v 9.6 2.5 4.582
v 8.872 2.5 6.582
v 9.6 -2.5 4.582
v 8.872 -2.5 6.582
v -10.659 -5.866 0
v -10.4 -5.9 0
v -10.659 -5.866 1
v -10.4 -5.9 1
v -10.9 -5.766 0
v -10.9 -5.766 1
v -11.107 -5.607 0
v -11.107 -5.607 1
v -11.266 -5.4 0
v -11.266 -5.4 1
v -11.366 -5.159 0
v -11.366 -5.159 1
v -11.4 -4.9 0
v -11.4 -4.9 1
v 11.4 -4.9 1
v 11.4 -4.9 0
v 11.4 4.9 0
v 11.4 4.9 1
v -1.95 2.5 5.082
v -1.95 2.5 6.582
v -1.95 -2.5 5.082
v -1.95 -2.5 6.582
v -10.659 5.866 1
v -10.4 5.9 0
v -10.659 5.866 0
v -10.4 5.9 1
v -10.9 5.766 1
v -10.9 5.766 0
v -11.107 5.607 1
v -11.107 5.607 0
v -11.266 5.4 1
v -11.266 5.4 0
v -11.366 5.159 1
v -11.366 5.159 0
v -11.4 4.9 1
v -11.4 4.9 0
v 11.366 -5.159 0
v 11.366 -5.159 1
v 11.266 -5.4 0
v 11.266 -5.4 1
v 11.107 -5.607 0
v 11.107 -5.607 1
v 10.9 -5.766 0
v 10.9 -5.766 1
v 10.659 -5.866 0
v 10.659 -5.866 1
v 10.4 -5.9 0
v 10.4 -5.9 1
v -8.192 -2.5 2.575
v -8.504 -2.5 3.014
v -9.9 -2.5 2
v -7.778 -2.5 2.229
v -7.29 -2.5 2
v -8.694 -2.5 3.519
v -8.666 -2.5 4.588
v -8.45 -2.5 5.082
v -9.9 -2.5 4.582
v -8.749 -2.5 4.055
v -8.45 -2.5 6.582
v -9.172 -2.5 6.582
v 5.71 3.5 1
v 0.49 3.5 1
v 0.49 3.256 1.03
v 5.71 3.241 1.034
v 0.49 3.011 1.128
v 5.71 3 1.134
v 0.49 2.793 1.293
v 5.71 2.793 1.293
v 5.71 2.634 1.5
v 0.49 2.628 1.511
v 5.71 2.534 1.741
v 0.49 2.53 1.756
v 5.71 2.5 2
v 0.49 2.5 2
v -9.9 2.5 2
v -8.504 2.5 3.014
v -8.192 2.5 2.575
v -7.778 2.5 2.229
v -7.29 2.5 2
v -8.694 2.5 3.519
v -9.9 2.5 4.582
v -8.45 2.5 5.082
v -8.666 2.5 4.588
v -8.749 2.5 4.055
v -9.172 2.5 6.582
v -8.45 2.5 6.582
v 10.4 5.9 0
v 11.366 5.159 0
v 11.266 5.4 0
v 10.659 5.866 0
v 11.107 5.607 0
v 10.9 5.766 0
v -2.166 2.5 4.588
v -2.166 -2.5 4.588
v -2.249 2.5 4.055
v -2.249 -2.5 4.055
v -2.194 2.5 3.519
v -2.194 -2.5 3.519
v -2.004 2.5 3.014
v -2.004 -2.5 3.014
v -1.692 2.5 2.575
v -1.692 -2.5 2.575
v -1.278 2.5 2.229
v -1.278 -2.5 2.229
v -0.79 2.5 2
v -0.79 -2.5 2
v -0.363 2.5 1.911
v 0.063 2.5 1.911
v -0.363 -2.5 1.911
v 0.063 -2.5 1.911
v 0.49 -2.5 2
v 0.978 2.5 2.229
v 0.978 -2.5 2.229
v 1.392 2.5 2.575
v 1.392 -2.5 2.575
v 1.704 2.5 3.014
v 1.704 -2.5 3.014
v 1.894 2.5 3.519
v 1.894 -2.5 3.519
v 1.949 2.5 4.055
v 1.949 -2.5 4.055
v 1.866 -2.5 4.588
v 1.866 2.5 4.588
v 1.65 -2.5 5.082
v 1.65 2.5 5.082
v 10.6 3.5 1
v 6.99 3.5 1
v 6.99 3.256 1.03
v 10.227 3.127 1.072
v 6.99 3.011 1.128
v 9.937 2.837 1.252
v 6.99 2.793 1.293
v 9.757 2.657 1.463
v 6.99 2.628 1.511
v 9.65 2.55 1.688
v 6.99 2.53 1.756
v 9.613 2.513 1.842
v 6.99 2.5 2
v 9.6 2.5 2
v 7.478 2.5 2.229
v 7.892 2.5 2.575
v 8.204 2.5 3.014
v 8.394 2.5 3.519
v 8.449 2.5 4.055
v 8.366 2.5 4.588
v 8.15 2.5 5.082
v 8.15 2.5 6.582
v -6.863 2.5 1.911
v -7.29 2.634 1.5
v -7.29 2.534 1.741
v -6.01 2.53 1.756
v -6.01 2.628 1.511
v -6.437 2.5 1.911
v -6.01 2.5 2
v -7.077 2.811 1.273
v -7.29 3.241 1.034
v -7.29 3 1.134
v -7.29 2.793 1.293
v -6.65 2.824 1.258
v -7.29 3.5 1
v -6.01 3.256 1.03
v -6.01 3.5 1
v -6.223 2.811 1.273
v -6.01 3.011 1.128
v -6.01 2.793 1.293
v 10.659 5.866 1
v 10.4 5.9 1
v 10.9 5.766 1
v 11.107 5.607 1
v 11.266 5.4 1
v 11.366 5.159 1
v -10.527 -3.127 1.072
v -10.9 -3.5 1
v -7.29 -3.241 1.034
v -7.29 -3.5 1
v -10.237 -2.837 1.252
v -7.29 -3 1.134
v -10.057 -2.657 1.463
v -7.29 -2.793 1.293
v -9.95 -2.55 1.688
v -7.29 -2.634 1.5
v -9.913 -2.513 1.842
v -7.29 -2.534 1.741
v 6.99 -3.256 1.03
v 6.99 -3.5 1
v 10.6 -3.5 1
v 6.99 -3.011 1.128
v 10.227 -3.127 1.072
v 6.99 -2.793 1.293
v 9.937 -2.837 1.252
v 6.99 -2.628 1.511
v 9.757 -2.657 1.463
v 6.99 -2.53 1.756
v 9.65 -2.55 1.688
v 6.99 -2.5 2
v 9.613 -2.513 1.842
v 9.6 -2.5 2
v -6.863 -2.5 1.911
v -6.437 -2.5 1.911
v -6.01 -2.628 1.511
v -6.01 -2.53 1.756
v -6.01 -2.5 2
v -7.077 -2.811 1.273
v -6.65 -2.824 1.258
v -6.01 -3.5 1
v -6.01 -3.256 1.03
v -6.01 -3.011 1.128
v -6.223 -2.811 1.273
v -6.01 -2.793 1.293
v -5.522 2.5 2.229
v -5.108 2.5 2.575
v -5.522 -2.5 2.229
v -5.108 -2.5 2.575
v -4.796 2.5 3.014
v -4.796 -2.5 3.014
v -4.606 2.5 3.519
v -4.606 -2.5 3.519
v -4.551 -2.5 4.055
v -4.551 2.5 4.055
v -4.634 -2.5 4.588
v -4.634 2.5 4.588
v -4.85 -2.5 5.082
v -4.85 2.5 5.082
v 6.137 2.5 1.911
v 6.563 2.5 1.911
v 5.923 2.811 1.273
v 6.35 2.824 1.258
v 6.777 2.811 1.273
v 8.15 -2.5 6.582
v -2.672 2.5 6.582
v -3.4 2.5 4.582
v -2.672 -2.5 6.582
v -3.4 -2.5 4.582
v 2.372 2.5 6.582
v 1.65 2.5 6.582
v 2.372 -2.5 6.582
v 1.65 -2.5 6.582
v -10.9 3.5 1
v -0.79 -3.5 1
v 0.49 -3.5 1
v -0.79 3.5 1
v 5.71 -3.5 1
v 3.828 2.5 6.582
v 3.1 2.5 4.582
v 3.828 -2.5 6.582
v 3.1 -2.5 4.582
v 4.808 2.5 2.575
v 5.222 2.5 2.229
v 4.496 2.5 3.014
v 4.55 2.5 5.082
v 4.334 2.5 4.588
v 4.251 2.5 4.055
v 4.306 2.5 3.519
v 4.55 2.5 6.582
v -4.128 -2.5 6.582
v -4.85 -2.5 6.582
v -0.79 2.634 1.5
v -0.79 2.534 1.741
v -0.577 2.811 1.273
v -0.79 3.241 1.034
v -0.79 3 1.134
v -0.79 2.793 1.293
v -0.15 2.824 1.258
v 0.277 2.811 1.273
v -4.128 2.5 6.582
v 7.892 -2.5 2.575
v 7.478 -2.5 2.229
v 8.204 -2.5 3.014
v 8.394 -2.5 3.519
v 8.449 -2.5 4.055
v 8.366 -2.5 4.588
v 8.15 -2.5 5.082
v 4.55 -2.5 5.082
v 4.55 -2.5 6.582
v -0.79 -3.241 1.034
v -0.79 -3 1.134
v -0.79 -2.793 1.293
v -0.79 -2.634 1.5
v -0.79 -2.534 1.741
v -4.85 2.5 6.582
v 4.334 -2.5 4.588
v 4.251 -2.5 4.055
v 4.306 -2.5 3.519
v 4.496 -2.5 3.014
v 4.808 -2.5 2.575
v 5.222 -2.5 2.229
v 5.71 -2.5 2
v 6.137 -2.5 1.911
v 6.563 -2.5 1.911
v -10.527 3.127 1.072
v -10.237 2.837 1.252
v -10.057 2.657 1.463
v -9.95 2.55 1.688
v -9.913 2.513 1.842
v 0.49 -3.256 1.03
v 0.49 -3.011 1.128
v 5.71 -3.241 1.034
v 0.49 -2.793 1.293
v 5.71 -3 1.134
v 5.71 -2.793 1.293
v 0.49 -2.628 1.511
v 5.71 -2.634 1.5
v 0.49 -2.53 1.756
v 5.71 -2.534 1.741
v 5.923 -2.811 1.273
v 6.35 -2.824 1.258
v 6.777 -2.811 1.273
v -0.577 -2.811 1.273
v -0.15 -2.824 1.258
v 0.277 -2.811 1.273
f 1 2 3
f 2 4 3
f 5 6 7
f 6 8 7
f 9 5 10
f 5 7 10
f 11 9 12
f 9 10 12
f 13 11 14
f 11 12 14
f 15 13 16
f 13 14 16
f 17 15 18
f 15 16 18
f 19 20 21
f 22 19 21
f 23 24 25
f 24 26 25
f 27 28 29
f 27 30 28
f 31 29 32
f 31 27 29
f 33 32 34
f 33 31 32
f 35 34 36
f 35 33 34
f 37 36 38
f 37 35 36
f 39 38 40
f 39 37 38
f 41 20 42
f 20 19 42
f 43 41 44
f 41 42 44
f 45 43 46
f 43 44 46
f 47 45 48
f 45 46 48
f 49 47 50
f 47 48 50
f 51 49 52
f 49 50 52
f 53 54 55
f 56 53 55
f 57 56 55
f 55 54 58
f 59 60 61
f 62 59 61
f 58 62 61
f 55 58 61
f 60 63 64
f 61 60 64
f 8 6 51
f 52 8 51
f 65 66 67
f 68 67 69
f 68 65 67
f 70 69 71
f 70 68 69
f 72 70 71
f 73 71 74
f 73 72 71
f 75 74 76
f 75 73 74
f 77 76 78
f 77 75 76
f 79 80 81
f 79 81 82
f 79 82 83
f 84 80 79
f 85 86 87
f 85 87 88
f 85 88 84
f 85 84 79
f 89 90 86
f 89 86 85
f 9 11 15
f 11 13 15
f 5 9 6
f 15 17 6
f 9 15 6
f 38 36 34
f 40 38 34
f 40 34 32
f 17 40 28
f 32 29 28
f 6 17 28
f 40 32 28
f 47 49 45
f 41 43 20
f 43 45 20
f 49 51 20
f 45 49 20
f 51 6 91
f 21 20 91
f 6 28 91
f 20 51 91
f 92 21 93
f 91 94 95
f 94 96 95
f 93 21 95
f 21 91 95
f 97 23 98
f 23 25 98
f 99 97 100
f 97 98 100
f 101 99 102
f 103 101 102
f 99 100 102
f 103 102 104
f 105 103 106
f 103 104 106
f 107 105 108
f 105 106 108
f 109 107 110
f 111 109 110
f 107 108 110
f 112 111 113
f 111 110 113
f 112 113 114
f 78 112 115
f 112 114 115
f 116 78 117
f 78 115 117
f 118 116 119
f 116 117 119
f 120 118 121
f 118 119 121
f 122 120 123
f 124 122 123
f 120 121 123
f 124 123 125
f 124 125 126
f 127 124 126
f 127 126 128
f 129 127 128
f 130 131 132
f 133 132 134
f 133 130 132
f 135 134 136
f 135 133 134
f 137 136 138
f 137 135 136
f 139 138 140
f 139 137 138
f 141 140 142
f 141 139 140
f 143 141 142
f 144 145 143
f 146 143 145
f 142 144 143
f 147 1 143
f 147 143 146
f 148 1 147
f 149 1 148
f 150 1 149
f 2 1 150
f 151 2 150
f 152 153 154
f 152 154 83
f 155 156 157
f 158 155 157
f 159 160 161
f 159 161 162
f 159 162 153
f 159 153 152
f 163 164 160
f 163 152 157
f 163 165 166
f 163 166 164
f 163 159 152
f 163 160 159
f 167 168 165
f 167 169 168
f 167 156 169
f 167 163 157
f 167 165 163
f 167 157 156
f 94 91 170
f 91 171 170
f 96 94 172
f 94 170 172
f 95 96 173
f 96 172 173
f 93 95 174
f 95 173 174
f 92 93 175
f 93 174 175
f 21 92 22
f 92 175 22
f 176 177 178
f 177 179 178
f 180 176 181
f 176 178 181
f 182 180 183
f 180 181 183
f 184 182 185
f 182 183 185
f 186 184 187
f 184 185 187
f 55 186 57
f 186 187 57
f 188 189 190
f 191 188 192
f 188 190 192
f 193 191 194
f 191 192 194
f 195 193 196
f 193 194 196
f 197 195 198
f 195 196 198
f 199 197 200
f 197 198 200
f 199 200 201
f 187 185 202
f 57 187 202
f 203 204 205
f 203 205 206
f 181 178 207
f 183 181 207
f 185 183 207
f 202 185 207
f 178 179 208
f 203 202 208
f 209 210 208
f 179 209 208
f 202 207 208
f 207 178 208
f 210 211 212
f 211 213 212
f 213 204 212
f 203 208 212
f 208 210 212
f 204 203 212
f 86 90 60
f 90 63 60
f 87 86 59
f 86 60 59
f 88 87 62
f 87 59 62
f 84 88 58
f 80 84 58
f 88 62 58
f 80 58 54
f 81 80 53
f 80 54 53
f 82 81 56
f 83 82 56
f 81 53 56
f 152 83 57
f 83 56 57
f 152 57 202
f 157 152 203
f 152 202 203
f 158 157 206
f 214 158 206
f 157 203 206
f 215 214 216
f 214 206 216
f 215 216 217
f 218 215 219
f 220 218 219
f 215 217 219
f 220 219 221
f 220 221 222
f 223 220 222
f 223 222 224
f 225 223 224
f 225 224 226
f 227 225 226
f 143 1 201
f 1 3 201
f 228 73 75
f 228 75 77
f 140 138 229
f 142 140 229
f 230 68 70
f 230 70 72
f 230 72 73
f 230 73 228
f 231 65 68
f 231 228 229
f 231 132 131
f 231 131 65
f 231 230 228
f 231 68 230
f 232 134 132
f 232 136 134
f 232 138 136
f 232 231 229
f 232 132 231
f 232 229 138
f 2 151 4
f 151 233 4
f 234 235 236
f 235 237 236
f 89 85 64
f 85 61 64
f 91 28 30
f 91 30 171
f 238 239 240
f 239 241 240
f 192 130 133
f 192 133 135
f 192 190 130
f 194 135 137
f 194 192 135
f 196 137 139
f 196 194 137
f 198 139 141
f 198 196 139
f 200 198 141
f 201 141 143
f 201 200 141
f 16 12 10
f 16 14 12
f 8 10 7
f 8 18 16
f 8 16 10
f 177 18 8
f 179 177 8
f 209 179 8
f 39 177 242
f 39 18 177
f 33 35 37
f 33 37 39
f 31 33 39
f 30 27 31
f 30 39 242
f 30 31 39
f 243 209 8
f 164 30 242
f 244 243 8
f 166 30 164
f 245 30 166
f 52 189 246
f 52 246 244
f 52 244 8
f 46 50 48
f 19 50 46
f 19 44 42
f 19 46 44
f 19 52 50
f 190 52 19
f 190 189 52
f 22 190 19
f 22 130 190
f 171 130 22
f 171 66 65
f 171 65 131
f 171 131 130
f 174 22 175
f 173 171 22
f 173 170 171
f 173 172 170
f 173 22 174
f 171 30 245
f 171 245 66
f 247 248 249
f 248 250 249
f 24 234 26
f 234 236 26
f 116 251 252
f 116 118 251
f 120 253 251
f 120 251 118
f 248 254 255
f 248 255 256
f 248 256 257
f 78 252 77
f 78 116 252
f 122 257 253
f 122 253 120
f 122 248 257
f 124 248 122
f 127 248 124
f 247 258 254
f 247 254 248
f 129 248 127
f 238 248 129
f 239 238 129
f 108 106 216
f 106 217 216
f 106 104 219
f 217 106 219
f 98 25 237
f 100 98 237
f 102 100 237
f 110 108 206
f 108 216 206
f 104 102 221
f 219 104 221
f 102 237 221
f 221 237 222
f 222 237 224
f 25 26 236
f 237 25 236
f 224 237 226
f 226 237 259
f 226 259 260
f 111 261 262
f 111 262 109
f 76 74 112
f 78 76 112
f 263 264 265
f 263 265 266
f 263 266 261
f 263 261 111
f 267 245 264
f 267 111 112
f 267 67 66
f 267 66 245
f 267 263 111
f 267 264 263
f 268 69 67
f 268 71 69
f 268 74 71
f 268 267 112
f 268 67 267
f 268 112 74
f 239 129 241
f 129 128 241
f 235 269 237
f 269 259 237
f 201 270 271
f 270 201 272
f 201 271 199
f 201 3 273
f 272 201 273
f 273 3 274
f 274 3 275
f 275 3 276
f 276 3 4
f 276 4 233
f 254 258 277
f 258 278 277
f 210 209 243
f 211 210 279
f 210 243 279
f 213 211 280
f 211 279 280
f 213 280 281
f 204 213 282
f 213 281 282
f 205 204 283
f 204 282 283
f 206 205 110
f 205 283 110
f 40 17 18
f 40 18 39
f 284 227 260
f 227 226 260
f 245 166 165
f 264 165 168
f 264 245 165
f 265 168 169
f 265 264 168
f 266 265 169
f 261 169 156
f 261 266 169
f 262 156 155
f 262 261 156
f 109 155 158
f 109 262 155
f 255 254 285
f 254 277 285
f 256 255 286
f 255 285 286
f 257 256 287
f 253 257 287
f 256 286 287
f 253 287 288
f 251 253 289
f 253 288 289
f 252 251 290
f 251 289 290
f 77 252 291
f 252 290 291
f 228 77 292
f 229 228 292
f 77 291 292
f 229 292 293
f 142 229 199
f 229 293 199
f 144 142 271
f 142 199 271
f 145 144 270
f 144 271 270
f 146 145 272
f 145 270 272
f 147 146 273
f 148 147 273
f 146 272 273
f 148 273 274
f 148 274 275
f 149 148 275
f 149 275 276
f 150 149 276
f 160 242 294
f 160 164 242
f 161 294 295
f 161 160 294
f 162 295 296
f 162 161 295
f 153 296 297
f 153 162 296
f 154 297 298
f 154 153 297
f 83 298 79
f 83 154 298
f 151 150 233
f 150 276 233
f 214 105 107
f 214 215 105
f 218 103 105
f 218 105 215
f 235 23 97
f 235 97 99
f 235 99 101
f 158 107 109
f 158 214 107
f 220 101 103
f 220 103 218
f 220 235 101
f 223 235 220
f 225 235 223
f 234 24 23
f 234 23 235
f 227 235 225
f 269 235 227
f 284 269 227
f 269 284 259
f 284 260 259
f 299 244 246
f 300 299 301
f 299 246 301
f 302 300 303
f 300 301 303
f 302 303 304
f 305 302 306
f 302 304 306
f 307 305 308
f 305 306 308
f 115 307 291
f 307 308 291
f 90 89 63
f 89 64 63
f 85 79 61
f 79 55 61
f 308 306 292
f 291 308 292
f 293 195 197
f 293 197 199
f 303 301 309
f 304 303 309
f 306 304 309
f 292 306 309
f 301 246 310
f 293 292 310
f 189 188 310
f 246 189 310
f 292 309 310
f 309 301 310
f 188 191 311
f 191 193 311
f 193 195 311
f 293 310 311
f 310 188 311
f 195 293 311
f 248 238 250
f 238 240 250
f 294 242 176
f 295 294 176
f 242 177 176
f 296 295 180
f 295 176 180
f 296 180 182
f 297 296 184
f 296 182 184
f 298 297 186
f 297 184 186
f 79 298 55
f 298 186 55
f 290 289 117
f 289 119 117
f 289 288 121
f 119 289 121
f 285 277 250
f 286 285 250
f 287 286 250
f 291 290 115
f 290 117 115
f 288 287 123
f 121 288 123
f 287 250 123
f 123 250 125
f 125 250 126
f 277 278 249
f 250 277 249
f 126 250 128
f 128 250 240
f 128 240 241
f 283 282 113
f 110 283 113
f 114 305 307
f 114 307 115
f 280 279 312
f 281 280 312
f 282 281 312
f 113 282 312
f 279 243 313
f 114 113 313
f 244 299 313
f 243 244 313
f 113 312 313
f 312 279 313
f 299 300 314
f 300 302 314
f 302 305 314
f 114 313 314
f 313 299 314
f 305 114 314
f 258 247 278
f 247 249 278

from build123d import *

# Parameters (mm, degrees)
SKETCH1_W           = 22.8
SKETCH1_H           = 11.8
BOSS_EXTRUDE1_DEPTH = 1
BOSS_EXTRUDE2_DEPTH = 2.5
LPATTERN2_COUNT     = 3
LPATTERN2_PITCH     = 6.5
FILLET1_R           = 1
FILLET2_R           = 1


with BuildPart() as part:
    # Sketch1 → Boss-Extrude1 (new body)
    with BuildSketch(Plane.XY):
        Rectangle(SKETCH1_W, SKETCH1_H)
    extrude(amount=BOSS_EXTRUDE1_DEPTH)

    # Sketch3 → Boss-Extrude2 (add, symmetric)
    with BuildSketch(Plane.XZ):
        with BuildLine():
            Line((-9.9, 1), (-9.9, 4.581665383))
            Line((-9.9, 4.581665383), (-9.172059531, 6.581665383))
            Line((-9.172059531, 6.581665383), (-8.45, 6.581665383))
            Line((-8.45, 6.581665383), (-8.45, 5.081665383))
            ThreePointArc((-8.45, 5.081665383), (-6.65, 1.9), (-4.85, 5.081665383))
            Line((-4.85, 5.081665383), (-4.85, 6.581665383))
            Line((-4.85, 6.581665383), (-4.127940469, 6.581665383))
            Line((-4.127940469, 6.581665383), (-3.4, 4.581665383))
            Line((-3.4, 4.581665383), (-3.4, 1))
            Line((-3.4, 1), (-9.9, 1))
        make_face()
    boss_extrude2 = extrude(amount=BOSS_EXTRUDE2_DEPTH, both=True)

    # LPattern2: Boss-Extrude2 ×3
    with Locations(*[(i * LPATTERN2_PITCH, 0, 0) for i in range(1, LPATTERN2_COUNT)]):
        add(boss_extrude2)

    # Fillet1
    fillet1_edges = [part.edges().sort_by_distance(p)[0] for p in [
        (-11.4, 5.9, 0.5),
        (11.4, 5.9, 0.5),
        (11.4, -5.9, 0.5),
        (-11.4, -5.9, 0.5),
    ]]
    fillet(fillet1_edges, radius=FILLET1_R)

    # Fillet2
    fillet2_edges = [part.edges().sort_by_distance(p)[0] for p in [
        (-0.15, 2.5, 1),
        (-9.9, 0, 1),
        (-0.15, -2.5, 1),
        (9.6, 0, 1),
    ]]
    fillet(fillet2_edges, radius=FILLET2_R)


solid = part.part
